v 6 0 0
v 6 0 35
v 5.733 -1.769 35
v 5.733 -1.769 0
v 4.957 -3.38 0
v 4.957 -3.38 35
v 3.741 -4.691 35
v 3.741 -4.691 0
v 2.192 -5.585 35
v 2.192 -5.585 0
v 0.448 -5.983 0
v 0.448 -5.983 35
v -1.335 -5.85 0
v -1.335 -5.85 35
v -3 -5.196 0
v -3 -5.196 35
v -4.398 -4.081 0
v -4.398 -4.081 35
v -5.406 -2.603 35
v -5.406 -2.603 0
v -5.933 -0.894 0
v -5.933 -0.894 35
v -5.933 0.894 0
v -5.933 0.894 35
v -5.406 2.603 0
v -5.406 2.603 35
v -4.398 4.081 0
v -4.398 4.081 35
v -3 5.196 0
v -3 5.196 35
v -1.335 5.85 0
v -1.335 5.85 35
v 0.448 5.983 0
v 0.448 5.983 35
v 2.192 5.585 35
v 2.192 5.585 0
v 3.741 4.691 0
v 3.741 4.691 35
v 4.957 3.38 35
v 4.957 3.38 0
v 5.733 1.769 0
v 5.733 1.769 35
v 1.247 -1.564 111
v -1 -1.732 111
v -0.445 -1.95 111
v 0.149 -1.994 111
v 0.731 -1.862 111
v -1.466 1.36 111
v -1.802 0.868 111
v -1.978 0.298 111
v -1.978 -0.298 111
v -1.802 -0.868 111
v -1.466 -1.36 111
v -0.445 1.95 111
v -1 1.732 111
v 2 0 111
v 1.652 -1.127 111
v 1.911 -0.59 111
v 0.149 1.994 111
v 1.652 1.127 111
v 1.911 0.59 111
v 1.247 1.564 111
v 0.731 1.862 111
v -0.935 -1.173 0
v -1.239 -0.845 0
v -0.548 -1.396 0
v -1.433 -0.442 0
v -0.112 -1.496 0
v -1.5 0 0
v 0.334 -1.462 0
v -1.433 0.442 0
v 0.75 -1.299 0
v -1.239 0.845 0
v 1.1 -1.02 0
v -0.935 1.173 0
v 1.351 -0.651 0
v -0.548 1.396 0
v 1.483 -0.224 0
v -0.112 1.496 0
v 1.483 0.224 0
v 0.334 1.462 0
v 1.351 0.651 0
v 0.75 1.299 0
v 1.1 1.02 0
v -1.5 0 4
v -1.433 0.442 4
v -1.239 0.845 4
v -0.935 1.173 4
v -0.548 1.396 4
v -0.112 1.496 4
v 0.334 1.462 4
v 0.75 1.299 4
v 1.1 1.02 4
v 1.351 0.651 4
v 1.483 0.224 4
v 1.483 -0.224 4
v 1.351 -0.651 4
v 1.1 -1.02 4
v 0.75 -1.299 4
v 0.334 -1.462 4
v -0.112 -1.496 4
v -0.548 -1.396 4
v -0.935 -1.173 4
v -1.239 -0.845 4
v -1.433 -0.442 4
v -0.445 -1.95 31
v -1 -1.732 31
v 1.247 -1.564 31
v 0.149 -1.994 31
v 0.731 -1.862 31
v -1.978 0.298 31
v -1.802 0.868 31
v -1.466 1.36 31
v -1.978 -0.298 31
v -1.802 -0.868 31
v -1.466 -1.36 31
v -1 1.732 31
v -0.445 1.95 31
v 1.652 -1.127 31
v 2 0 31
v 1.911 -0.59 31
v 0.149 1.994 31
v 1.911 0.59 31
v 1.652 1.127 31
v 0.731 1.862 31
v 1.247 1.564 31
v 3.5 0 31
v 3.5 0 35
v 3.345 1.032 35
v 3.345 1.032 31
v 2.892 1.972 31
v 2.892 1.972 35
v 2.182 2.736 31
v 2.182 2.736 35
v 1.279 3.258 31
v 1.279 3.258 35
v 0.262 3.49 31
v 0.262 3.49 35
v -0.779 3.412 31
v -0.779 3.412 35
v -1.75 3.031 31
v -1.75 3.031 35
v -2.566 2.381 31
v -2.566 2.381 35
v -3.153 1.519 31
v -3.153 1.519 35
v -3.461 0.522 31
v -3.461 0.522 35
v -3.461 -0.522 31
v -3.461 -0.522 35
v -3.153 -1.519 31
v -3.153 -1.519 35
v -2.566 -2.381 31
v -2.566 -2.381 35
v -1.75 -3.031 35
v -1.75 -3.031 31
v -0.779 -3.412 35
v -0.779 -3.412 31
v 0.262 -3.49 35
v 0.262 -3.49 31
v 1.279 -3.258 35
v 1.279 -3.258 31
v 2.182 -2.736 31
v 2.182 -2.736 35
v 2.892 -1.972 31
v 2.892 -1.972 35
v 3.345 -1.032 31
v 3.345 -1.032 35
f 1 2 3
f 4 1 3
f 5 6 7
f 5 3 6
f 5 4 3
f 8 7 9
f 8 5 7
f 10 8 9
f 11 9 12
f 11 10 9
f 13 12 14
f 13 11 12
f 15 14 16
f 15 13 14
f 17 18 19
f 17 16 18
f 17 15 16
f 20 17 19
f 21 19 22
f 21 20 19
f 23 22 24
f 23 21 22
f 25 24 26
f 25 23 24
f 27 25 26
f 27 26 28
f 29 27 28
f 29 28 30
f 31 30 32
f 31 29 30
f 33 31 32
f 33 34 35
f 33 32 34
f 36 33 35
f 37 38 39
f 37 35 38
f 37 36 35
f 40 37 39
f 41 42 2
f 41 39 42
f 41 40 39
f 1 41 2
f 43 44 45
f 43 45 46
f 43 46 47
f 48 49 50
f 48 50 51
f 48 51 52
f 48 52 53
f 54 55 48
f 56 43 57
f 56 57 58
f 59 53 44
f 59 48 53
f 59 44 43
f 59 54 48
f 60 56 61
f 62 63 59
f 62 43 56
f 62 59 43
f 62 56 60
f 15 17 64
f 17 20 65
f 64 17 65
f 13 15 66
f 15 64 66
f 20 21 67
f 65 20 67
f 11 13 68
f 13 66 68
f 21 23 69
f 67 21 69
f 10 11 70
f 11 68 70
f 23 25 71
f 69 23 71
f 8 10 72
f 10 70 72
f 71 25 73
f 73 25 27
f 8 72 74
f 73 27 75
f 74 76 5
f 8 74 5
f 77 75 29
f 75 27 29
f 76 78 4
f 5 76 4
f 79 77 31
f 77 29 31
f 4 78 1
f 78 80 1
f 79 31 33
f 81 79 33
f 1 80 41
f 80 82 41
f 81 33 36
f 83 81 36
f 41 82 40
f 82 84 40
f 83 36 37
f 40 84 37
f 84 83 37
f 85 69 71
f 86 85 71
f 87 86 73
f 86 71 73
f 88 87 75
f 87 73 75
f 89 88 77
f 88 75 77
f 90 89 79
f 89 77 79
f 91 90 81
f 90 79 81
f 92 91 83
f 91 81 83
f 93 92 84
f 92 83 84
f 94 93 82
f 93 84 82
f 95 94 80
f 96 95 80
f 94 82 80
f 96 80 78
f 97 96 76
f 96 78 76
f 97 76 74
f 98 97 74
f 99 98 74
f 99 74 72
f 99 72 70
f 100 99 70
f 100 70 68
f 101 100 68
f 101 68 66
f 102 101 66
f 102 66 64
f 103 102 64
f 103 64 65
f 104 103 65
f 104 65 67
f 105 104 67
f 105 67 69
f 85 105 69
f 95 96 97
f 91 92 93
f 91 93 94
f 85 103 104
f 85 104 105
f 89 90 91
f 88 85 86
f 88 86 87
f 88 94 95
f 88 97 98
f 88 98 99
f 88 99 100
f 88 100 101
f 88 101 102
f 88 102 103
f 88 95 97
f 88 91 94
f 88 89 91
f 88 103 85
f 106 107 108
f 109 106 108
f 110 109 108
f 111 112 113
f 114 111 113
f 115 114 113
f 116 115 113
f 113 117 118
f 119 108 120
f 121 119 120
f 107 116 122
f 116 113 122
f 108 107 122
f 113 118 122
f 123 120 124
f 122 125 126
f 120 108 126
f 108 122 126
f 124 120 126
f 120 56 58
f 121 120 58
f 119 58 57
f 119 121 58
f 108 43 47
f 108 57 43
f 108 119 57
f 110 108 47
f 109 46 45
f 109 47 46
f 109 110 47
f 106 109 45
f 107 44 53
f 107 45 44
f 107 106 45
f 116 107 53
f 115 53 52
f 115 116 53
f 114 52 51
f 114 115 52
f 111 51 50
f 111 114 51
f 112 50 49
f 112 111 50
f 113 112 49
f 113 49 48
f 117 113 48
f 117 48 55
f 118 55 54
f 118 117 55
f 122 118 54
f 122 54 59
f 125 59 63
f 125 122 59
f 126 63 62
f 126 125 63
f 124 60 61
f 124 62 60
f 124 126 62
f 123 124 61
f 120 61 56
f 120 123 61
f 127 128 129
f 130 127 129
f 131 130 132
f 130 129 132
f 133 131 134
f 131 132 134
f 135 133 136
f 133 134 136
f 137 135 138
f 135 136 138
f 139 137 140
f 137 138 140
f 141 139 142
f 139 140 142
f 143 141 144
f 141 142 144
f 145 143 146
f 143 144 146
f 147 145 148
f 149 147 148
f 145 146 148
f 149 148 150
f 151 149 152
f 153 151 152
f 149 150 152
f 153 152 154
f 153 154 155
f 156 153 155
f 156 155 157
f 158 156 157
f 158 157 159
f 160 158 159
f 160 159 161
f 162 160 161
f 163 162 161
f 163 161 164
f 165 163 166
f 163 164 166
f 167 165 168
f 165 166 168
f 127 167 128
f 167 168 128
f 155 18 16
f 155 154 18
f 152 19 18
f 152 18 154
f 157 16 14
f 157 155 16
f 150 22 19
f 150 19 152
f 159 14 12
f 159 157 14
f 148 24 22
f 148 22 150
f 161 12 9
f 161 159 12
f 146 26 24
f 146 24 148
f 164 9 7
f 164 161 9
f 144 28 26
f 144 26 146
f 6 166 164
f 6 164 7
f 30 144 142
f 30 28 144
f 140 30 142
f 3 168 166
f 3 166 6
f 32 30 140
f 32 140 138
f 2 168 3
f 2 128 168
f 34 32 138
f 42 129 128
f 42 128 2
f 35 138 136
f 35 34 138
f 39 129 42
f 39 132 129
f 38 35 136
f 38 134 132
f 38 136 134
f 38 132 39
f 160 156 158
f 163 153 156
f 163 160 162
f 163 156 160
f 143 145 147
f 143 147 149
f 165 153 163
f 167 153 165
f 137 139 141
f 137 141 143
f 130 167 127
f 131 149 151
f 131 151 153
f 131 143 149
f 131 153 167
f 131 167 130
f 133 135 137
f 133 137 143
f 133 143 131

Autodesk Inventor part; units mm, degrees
ref_plane "YZ Plane" through (0, 0, 0) normal (1, 0, 0) x (0, 1, 0)
ref_plane "XZ Plane" through (0, 0, 0) normal (0, 1, 0) x (-1, 0, 0)
ref_plane "XY Plane" through (0, 0, 0) normal (0, 0, 1) x (1, 0, 0)
sketch "Эскиз1" plane through (0, 0, 0) normal (0, 0, 1) x (1, 0, 0)
  circle A0 centre (0, 0) radius 6
  dimension "d0" = 12
extrude "Выдавливание1" add sketch "Эскиз1" along normal blind 35
sketch "Эскиз2" plane through (0, 0, 35) normal (0, 0, 1) x (1, 0, 0)
  circle A0 centre (0, 0) radius 3.5
  dimension "d3" = 7
extrude "Выдавливание2" cut sketch "Эскиз2" against normal blind 4
sketch "Эскиз3" plane through (0, 0, 0) normal (0, 0, -1) x (-1, 0, 0)
  circle A0 centre (0, 0) radius 1.5
  dimension "d6" = 3
extrude "Выдавливание3" cut sketch "Эскиз3" against normal blind 4
sketch "Эскиз8" plane through (0, 0, 31) normal (0, 0, 1) x (1, 0, 0)
  circle A0 centre (0, 0) radius 2
  dimension "d21" = 4
extrude "Выдавливание8" add sketch "Эскиз8" along normal blind 80 separate body
properties part number "Лазер"
